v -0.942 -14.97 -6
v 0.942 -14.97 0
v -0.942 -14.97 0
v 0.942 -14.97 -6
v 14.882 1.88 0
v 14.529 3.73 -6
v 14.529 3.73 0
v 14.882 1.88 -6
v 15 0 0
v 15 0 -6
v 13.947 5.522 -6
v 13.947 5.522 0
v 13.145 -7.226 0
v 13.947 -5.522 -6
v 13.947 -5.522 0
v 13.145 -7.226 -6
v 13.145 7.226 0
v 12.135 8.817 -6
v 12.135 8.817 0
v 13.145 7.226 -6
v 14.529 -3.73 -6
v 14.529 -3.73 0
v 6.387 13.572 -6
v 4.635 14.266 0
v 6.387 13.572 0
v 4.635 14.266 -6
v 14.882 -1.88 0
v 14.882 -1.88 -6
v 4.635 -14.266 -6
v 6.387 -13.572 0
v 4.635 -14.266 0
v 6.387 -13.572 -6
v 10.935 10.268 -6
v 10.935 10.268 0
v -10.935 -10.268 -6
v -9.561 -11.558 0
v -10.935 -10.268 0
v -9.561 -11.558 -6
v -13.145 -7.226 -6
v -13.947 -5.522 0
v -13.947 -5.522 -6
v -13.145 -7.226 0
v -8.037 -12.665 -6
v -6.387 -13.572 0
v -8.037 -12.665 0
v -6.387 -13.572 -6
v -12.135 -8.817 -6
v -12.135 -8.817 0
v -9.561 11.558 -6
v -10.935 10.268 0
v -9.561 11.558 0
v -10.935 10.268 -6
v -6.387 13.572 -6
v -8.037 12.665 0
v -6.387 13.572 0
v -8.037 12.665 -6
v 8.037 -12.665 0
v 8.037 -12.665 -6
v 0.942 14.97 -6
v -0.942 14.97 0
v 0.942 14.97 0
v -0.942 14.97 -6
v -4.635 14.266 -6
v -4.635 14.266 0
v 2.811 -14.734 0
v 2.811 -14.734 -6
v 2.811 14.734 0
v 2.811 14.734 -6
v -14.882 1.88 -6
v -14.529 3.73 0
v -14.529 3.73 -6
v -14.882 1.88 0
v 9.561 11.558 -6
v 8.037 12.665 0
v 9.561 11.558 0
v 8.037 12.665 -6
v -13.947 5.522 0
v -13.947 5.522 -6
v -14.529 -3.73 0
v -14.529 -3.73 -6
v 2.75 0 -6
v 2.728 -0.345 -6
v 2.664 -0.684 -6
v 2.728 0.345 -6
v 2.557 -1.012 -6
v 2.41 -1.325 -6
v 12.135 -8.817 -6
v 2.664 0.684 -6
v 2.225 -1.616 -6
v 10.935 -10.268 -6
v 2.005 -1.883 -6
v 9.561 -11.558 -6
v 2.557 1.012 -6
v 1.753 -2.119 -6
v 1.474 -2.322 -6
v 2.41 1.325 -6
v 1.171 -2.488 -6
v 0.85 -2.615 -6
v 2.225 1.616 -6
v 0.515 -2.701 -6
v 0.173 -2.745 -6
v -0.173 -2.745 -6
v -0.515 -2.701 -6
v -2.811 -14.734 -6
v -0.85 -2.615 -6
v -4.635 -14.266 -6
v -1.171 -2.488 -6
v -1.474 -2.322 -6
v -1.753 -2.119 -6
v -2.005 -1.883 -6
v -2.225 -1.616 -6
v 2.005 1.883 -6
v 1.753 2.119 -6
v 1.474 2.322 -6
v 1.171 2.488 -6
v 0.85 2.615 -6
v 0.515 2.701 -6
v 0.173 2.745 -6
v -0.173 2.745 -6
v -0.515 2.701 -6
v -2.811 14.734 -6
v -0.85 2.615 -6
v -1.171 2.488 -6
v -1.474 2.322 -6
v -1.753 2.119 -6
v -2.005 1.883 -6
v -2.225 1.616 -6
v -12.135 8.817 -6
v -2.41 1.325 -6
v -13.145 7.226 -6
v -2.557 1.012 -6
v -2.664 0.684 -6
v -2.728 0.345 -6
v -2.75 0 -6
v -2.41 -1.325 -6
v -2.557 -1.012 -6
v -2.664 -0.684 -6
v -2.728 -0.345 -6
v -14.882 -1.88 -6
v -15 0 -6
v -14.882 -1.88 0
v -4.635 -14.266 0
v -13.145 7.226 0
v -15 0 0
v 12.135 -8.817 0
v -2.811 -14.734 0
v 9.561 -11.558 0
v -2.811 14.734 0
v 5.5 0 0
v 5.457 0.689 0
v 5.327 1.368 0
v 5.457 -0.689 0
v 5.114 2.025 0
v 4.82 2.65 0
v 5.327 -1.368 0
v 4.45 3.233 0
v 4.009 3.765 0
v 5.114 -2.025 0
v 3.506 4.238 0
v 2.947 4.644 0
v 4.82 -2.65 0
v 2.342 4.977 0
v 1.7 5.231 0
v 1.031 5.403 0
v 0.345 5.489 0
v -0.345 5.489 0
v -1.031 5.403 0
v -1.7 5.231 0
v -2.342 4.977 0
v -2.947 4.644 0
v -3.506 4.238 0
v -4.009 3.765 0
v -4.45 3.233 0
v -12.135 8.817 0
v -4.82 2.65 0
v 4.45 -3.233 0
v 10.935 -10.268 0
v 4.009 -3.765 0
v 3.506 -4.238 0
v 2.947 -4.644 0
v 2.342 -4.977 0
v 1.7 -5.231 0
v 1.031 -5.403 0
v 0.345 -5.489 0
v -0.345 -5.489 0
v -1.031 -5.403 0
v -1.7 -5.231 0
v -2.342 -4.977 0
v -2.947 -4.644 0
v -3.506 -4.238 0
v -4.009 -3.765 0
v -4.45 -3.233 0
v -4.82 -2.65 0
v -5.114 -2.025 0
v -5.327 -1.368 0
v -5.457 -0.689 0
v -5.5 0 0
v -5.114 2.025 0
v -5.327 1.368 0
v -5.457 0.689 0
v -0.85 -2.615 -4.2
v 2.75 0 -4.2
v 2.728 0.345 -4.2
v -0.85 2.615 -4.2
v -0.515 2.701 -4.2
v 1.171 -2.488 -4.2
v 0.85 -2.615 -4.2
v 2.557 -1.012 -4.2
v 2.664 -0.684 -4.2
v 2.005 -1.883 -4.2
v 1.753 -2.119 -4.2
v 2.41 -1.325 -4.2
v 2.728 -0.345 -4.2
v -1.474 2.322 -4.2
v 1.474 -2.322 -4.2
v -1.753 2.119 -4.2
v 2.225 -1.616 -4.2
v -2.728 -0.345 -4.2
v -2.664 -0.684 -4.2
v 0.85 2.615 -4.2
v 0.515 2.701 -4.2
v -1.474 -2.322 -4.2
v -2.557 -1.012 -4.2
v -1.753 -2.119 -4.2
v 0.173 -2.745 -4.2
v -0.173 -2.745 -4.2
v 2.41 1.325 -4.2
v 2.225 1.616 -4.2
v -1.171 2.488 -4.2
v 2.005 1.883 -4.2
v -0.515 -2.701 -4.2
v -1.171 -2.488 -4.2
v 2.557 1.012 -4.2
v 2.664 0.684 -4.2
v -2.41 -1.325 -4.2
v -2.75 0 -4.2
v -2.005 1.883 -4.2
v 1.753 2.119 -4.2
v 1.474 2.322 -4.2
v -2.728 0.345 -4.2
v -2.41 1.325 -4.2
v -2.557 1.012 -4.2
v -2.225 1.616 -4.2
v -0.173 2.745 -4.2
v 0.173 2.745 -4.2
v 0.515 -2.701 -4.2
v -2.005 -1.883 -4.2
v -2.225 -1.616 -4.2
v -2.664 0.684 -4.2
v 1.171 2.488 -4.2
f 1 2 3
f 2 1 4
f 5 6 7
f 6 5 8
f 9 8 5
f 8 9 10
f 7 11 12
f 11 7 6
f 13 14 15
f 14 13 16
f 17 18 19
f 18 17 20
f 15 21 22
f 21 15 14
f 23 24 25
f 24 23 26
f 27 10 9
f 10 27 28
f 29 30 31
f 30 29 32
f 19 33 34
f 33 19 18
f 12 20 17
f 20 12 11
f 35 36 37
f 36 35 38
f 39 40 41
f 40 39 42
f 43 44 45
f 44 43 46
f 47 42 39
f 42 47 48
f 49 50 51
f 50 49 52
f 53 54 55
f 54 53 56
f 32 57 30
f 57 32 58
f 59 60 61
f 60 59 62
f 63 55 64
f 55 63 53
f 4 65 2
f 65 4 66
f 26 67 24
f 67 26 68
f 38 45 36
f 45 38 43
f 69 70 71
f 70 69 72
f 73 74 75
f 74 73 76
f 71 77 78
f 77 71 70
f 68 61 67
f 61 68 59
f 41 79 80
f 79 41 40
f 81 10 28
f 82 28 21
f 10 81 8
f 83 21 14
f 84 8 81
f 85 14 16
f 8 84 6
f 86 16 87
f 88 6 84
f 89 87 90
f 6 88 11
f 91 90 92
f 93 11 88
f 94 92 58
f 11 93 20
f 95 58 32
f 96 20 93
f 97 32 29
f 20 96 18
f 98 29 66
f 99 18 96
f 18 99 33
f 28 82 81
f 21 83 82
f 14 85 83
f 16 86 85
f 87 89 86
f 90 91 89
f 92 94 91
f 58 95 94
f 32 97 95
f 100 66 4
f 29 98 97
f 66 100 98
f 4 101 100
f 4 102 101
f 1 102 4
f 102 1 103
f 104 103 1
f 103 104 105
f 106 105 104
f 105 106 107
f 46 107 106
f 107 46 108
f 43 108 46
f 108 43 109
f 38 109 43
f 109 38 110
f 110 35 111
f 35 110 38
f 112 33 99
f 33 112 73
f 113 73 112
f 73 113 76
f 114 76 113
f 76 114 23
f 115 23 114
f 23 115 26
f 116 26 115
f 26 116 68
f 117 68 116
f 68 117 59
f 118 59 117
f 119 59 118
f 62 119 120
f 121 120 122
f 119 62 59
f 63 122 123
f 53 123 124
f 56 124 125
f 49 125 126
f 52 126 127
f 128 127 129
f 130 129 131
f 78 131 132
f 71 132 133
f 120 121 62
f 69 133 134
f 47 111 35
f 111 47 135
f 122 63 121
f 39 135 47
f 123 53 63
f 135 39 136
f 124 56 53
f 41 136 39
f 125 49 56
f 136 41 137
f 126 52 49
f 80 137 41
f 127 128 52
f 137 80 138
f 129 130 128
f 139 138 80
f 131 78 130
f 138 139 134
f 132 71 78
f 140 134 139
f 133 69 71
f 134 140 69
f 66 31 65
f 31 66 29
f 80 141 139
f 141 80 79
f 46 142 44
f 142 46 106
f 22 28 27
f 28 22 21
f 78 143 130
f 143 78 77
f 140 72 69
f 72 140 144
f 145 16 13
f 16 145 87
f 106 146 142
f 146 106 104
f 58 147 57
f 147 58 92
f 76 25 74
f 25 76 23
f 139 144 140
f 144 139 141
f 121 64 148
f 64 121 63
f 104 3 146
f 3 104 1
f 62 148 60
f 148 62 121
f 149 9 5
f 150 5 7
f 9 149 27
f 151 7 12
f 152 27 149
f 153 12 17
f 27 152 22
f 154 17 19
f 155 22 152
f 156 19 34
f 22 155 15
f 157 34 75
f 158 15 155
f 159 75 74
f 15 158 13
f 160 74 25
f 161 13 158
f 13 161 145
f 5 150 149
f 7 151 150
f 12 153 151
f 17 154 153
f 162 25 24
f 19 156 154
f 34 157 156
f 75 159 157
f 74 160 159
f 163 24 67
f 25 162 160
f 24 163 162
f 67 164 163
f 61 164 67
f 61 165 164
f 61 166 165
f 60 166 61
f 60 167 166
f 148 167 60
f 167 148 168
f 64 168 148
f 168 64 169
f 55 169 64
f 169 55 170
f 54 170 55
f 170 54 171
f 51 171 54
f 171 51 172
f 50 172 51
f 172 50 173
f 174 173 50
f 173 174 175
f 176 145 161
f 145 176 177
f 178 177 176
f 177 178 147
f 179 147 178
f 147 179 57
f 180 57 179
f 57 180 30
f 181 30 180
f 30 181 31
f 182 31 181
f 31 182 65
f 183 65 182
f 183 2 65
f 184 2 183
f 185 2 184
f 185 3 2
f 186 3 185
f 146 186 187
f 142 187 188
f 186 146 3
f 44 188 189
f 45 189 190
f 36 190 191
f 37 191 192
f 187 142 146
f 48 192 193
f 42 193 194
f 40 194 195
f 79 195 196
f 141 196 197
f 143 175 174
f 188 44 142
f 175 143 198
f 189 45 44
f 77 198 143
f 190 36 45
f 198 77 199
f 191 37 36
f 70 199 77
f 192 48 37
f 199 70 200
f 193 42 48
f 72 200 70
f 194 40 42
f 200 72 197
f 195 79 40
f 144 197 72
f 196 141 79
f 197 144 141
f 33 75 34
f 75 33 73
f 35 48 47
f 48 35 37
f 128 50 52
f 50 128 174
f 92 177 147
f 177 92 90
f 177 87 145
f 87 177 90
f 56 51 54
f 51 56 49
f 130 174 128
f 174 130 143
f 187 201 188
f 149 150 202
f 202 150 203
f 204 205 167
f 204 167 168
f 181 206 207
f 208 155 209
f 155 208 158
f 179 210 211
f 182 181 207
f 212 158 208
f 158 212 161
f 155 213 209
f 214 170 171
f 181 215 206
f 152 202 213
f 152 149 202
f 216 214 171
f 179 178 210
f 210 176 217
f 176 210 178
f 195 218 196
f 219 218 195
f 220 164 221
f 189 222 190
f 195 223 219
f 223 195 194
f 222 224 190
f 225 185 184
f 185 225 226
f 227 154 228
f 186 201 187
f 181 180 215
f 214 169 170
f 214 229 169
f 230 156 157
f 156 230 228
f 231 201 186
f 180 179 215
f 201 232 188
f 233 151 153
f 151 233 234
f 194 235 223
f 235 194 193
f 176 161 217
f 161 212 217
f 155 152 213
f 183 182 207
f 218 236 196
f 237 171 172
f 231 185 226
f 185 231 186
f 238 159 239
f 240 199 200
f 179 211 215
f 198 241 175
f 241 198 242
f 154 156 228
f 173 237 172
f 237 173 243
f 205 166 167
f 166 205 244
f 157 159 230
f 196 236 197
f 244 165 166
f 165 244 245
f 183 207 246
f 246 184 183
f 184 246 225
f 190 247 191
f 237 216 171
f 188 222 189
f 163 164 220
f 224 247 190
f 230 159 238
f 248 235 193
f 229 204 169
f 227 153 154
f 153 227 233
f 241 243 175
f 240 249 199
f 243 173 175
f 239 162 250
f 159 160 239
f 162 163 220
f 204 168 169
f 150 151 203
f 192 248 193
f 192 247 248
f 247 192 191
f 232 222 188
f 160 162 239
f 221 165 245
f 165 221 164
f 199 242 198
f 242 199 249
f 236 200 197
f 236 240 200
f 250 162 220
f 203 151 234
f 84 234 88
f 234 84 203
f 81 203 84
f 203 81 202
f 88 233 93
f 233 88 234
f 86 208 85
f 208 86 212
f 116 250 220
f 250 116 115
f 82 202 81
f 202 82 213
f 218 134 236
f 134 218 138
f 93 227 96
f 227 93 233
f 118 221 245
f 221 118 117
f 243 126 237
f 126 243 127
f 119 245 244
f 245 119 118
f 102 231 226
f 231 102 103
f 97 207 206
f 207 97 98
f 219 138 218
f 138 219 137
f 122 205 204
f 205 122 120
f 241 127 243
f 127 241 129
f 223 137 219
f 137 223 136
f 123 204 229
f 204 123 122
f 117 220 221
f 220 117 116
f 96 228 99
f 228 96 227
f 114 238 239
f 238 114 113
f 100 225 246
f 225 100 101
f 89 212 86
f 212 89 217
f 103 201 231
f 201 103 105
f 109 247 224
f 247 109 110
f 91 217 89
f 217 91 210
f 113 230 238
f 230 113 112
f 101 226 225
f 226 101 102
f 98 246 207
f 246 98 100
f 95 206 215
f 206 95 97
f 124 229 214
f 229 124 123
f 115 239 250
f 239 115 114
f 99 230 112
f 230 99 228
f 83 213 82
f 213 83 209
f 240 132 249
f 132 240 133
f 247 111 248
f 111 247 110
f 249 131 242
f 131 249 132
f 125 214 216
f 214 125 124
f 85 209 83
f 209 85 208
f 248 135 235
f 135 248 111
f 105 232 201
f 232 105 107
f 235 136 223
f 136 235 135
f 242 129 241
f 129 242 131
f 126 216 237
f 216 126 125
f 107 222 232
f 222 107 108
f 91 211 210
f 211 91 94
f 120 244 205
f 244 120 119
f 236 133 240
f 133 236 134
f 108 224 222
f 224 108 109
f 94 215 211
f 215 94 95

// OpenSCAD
$fn = 50;


difference() {
	union() {
		translate(v = [0, 0, -6.0000000000]) {
			cylinder(h = 6, r = 15.0000000000);
		}
		translate(v = [0, 0, -6.0000000000]) {
			cylinder(h = 6, r = 2.8750000000);
		}
	}
	union() {
		translate(v = [0, 0, 0]) {
			rotate(a = [0, 0, 0]) {
				difference() {
					union() {
						translate(v = [0, 0, -6.0000000000]) {
							cylinder(h = 6, r = 2.2500000000);
						}
						translate(v = [0, 0, -4.2000000000]) {
							cylinder(h = 4.2000000000, r1 = 2.7500000000, r2 = 5.5000000000);
						}
						translate(v = [0, 0, -6.0000000000]) {
							cylinder(h = 6, r = 2.7500000000);
						}
						translate(v = [0, 0, -6.0000000000]) {
							cylinder(h = 6, r = 2.2500000000);
						}
					}
					union();
				}
			}
		}
	}
}
